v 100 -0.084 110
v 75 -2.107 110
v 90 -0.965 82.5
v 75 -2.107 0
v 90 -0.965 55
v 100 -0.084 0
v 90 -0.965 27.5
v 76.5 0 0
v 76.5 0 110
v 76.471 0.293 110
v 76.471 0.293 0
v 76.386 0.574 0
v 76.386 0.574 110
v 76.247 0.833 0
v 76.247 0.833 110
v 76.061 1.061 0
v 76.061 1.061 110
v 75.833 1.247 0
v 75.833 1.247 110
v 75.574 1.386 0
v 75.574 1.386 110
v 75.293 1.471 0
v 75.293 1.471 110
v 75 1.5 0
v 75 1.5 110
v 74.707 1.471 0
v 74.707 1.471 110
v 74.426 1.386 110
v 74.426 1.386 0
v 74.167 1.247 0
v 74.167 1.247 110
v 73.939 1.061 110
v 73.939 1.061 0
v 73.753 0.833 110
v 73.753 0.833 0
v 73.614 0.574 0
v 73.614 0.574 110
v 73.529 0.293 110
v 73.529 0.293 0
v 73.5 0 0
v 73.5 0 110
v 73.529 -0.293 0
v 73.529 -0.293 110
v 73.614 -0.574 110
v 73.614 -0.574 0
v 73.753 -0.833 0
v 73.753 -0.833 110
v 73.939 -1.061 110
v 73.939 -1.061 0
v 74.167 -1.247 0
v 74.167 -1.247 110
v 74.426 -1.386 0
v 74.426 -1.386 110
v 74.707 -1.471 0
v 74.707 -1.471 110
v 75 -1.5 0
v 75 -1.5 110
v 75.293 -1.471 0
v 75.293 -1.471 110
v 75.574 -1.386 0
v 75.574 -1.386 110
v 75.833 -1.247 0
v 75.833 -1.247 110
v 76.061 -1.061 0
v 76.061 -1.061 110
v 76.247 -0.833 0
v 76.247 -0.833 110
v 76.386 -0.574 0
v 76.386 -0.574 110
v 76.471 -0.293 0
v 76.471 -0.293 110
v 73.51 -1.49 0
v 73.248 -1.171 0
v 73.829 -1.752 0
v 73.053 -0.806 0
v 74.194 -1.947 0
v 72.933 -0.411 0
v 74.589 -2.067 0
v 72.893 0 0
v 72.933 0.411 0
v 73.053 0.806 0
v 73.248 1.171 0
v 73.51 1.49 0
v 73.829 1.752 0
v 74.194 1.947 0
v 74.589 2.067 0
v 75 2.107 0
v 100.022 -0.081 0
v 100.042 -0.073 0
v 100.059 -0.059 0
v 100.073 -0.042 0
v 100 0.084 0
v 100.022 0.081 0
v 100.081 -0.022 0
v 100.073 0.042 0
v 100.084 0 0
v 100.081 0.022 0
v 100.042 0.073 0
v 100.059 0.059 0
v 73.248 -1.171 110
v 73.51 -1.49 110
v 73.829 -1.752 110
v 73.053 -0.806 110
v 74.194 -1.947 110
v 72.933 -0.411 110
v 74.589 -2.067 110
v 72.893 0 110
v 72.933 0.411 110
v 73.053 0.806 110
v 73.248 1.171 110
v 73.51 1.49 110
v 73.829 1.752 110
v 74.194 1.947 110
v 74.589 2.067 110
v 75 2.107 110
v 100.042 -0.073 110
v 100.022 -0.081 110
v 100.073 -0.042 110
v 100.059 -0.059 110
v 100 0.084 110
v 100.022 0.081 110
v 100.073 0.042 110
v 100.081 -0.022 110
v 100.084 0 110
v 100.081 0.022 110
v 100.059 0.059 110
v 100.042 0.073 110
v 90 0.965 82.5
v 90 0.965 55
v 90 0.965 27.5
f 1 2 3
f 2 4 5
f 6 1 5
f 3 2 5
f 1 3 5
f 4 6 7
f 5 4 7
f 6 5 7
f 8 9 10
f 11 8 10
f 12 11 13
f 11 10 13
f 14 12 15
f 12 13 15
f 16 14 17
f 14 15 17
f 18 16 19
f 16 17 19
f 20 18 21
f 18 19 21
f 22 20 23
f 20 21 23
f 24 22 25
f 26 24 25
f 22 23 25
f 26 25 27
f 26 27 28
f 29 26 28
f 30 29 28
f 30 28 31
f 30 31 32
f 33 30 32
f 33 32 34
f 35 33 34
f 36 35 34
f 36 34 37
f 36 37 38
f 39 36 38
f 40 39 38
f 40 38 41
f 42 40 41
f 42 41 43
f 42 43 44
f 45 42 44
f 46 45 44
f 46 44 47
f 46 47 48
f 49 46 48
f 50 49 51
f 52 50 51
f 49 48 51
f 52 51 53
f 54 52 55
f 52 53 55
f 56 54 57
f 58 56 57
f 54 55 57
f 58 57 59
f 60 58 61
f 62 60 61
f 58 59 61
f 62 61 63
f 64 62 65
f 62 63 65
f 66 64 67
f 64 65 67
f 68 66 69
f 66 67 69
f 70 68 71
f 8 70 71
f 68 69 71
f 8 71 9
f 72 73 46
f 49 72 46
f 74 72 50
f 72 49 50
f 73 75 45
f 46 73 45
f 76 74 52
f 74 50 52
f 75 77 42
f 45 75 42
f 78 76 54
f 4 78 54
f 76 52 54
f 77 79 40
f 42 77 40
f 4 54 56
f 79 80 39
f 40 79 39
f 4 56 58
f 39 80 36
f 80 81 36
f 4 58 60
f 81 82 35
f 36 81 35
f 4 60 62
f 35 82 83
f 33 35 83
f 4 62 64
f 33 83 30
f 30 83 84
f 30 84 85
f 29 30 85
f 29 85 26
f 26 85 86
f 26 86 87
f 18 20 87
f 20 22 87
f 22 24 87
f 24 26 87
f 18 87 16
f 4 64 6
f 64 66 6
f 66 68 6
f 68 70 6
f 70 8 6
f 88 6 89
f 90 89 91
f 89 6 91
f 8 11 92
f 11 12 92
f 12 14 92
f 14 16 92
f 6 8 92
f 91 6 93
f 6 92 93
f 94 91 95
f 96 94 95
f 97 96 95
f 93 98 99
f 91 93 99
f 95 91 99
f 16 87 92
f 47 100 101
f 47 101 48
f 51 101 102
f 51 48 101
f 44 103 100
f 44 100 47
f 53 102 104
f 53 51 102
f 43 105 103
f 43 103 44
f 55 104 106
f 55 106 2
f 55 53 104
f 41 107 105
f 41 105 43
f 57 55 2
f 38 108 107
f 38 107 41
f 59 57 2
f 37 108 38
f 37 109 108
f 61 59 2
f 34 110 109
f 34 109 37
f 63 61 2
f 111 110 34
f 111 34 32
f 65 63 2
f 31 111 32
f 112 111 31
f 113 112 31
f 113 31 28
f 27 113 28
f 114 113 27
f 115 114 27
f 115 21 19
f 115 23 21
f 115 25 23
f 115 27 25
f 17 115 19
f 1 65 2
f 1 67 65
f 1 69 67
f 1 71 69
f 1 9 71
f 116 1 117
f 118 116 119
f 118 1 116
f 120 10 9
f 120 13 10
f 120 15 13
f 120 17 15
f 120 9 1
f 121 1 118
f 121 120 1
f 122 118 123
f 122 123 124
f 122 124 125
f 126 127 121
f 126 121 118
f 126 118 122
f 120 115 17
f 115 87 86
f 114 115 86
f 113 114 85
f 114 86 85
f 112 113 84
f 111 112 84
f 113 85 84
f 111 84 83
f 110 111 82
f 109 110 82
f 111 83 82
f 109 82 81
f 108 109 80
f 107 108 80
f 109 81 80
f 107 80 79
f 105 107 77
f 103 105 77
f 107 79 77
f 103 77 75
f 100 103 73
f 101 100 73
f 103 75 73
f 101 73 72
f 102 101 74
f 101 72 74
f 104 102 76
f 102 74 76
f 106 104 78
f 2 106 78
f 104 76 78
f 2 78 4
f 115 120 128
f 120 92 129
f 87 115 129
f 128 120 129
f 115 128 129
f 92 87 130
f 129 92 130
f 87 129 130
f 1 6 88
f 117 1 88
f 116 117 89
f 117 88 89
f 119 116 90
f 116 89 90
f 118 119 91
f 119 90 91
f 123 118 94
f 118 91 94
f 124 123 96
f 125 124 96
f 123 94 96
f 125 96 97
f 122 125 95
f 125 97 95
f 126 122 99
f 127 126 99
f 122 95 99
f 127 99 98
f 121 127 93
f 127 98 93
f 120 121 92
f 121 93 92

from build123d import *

# Parameters (mm, degrees)
ESTRUSIONE_ESTRUSIONE1_DEPTH = 110
SCHIZZO3_R                   = 1.5
TAGLIO_ESTRUSIONE1_DEPTH     = 149.732133239


with BuildPart() as part:
    # Schizzo2 → Estrusione-Estrusione1 (new body)
    with BuildSketch(Plane.XY):
        with BuildLine():
            ThreePointArc((75, 2.107216055), (72.892783945, 0), (75, -2.107216055))
            add(Edge.make_bspline(
                [(75, -2.107216055), (76.666929758, -1.991522695), (81.668631409, -1.633155952), (88.335559621, -1.11089898), (95.001194725, -0.542172689), (98.333488815, -0.23674648), (100, -0.084)],
                knots=[0.875718334, 0.875718334, 0.875718334, 0.875718334, 0.900556598, 0.950258285, 0.975123707, 1, 1, 1, 1], degree=3))
            ThreePointArc((100, -0.084), (100.084, 0), (100, 0.084))
            add(Edge.make_bspline(
                [(100, 0.084), (98.333488815, 0.23674648), (95.001194725, 0.542172689), (88.335559621, 1.11089898), (81.668631409, 1.633155952), (76.666929758, 1.991522695), (75, 2.107216055)],
                knots=[0, 0, 0, 0, 0.024876293, 0.049741715, 0.099443402, 0.124281666, 0.124281666, 0.124281666, 0.124281666], degree=3))
        make_face()
    extrude(amount=ESTRUSIONE_ESTRUSIONE1_DEPTH)

    # Schizzo3 → Taglio-Estrusione1 (cut, through all)
    with BuildSketch(Plane.XY.offset(110)):
        with Locations((75, 0)):
            Circle(SCHIZZO3_R)
    extrude(amount=-TAGLIO_ESTRUSIONE1_DEPTH, mode=Mode.SUBTRACT)


solid = part.part
